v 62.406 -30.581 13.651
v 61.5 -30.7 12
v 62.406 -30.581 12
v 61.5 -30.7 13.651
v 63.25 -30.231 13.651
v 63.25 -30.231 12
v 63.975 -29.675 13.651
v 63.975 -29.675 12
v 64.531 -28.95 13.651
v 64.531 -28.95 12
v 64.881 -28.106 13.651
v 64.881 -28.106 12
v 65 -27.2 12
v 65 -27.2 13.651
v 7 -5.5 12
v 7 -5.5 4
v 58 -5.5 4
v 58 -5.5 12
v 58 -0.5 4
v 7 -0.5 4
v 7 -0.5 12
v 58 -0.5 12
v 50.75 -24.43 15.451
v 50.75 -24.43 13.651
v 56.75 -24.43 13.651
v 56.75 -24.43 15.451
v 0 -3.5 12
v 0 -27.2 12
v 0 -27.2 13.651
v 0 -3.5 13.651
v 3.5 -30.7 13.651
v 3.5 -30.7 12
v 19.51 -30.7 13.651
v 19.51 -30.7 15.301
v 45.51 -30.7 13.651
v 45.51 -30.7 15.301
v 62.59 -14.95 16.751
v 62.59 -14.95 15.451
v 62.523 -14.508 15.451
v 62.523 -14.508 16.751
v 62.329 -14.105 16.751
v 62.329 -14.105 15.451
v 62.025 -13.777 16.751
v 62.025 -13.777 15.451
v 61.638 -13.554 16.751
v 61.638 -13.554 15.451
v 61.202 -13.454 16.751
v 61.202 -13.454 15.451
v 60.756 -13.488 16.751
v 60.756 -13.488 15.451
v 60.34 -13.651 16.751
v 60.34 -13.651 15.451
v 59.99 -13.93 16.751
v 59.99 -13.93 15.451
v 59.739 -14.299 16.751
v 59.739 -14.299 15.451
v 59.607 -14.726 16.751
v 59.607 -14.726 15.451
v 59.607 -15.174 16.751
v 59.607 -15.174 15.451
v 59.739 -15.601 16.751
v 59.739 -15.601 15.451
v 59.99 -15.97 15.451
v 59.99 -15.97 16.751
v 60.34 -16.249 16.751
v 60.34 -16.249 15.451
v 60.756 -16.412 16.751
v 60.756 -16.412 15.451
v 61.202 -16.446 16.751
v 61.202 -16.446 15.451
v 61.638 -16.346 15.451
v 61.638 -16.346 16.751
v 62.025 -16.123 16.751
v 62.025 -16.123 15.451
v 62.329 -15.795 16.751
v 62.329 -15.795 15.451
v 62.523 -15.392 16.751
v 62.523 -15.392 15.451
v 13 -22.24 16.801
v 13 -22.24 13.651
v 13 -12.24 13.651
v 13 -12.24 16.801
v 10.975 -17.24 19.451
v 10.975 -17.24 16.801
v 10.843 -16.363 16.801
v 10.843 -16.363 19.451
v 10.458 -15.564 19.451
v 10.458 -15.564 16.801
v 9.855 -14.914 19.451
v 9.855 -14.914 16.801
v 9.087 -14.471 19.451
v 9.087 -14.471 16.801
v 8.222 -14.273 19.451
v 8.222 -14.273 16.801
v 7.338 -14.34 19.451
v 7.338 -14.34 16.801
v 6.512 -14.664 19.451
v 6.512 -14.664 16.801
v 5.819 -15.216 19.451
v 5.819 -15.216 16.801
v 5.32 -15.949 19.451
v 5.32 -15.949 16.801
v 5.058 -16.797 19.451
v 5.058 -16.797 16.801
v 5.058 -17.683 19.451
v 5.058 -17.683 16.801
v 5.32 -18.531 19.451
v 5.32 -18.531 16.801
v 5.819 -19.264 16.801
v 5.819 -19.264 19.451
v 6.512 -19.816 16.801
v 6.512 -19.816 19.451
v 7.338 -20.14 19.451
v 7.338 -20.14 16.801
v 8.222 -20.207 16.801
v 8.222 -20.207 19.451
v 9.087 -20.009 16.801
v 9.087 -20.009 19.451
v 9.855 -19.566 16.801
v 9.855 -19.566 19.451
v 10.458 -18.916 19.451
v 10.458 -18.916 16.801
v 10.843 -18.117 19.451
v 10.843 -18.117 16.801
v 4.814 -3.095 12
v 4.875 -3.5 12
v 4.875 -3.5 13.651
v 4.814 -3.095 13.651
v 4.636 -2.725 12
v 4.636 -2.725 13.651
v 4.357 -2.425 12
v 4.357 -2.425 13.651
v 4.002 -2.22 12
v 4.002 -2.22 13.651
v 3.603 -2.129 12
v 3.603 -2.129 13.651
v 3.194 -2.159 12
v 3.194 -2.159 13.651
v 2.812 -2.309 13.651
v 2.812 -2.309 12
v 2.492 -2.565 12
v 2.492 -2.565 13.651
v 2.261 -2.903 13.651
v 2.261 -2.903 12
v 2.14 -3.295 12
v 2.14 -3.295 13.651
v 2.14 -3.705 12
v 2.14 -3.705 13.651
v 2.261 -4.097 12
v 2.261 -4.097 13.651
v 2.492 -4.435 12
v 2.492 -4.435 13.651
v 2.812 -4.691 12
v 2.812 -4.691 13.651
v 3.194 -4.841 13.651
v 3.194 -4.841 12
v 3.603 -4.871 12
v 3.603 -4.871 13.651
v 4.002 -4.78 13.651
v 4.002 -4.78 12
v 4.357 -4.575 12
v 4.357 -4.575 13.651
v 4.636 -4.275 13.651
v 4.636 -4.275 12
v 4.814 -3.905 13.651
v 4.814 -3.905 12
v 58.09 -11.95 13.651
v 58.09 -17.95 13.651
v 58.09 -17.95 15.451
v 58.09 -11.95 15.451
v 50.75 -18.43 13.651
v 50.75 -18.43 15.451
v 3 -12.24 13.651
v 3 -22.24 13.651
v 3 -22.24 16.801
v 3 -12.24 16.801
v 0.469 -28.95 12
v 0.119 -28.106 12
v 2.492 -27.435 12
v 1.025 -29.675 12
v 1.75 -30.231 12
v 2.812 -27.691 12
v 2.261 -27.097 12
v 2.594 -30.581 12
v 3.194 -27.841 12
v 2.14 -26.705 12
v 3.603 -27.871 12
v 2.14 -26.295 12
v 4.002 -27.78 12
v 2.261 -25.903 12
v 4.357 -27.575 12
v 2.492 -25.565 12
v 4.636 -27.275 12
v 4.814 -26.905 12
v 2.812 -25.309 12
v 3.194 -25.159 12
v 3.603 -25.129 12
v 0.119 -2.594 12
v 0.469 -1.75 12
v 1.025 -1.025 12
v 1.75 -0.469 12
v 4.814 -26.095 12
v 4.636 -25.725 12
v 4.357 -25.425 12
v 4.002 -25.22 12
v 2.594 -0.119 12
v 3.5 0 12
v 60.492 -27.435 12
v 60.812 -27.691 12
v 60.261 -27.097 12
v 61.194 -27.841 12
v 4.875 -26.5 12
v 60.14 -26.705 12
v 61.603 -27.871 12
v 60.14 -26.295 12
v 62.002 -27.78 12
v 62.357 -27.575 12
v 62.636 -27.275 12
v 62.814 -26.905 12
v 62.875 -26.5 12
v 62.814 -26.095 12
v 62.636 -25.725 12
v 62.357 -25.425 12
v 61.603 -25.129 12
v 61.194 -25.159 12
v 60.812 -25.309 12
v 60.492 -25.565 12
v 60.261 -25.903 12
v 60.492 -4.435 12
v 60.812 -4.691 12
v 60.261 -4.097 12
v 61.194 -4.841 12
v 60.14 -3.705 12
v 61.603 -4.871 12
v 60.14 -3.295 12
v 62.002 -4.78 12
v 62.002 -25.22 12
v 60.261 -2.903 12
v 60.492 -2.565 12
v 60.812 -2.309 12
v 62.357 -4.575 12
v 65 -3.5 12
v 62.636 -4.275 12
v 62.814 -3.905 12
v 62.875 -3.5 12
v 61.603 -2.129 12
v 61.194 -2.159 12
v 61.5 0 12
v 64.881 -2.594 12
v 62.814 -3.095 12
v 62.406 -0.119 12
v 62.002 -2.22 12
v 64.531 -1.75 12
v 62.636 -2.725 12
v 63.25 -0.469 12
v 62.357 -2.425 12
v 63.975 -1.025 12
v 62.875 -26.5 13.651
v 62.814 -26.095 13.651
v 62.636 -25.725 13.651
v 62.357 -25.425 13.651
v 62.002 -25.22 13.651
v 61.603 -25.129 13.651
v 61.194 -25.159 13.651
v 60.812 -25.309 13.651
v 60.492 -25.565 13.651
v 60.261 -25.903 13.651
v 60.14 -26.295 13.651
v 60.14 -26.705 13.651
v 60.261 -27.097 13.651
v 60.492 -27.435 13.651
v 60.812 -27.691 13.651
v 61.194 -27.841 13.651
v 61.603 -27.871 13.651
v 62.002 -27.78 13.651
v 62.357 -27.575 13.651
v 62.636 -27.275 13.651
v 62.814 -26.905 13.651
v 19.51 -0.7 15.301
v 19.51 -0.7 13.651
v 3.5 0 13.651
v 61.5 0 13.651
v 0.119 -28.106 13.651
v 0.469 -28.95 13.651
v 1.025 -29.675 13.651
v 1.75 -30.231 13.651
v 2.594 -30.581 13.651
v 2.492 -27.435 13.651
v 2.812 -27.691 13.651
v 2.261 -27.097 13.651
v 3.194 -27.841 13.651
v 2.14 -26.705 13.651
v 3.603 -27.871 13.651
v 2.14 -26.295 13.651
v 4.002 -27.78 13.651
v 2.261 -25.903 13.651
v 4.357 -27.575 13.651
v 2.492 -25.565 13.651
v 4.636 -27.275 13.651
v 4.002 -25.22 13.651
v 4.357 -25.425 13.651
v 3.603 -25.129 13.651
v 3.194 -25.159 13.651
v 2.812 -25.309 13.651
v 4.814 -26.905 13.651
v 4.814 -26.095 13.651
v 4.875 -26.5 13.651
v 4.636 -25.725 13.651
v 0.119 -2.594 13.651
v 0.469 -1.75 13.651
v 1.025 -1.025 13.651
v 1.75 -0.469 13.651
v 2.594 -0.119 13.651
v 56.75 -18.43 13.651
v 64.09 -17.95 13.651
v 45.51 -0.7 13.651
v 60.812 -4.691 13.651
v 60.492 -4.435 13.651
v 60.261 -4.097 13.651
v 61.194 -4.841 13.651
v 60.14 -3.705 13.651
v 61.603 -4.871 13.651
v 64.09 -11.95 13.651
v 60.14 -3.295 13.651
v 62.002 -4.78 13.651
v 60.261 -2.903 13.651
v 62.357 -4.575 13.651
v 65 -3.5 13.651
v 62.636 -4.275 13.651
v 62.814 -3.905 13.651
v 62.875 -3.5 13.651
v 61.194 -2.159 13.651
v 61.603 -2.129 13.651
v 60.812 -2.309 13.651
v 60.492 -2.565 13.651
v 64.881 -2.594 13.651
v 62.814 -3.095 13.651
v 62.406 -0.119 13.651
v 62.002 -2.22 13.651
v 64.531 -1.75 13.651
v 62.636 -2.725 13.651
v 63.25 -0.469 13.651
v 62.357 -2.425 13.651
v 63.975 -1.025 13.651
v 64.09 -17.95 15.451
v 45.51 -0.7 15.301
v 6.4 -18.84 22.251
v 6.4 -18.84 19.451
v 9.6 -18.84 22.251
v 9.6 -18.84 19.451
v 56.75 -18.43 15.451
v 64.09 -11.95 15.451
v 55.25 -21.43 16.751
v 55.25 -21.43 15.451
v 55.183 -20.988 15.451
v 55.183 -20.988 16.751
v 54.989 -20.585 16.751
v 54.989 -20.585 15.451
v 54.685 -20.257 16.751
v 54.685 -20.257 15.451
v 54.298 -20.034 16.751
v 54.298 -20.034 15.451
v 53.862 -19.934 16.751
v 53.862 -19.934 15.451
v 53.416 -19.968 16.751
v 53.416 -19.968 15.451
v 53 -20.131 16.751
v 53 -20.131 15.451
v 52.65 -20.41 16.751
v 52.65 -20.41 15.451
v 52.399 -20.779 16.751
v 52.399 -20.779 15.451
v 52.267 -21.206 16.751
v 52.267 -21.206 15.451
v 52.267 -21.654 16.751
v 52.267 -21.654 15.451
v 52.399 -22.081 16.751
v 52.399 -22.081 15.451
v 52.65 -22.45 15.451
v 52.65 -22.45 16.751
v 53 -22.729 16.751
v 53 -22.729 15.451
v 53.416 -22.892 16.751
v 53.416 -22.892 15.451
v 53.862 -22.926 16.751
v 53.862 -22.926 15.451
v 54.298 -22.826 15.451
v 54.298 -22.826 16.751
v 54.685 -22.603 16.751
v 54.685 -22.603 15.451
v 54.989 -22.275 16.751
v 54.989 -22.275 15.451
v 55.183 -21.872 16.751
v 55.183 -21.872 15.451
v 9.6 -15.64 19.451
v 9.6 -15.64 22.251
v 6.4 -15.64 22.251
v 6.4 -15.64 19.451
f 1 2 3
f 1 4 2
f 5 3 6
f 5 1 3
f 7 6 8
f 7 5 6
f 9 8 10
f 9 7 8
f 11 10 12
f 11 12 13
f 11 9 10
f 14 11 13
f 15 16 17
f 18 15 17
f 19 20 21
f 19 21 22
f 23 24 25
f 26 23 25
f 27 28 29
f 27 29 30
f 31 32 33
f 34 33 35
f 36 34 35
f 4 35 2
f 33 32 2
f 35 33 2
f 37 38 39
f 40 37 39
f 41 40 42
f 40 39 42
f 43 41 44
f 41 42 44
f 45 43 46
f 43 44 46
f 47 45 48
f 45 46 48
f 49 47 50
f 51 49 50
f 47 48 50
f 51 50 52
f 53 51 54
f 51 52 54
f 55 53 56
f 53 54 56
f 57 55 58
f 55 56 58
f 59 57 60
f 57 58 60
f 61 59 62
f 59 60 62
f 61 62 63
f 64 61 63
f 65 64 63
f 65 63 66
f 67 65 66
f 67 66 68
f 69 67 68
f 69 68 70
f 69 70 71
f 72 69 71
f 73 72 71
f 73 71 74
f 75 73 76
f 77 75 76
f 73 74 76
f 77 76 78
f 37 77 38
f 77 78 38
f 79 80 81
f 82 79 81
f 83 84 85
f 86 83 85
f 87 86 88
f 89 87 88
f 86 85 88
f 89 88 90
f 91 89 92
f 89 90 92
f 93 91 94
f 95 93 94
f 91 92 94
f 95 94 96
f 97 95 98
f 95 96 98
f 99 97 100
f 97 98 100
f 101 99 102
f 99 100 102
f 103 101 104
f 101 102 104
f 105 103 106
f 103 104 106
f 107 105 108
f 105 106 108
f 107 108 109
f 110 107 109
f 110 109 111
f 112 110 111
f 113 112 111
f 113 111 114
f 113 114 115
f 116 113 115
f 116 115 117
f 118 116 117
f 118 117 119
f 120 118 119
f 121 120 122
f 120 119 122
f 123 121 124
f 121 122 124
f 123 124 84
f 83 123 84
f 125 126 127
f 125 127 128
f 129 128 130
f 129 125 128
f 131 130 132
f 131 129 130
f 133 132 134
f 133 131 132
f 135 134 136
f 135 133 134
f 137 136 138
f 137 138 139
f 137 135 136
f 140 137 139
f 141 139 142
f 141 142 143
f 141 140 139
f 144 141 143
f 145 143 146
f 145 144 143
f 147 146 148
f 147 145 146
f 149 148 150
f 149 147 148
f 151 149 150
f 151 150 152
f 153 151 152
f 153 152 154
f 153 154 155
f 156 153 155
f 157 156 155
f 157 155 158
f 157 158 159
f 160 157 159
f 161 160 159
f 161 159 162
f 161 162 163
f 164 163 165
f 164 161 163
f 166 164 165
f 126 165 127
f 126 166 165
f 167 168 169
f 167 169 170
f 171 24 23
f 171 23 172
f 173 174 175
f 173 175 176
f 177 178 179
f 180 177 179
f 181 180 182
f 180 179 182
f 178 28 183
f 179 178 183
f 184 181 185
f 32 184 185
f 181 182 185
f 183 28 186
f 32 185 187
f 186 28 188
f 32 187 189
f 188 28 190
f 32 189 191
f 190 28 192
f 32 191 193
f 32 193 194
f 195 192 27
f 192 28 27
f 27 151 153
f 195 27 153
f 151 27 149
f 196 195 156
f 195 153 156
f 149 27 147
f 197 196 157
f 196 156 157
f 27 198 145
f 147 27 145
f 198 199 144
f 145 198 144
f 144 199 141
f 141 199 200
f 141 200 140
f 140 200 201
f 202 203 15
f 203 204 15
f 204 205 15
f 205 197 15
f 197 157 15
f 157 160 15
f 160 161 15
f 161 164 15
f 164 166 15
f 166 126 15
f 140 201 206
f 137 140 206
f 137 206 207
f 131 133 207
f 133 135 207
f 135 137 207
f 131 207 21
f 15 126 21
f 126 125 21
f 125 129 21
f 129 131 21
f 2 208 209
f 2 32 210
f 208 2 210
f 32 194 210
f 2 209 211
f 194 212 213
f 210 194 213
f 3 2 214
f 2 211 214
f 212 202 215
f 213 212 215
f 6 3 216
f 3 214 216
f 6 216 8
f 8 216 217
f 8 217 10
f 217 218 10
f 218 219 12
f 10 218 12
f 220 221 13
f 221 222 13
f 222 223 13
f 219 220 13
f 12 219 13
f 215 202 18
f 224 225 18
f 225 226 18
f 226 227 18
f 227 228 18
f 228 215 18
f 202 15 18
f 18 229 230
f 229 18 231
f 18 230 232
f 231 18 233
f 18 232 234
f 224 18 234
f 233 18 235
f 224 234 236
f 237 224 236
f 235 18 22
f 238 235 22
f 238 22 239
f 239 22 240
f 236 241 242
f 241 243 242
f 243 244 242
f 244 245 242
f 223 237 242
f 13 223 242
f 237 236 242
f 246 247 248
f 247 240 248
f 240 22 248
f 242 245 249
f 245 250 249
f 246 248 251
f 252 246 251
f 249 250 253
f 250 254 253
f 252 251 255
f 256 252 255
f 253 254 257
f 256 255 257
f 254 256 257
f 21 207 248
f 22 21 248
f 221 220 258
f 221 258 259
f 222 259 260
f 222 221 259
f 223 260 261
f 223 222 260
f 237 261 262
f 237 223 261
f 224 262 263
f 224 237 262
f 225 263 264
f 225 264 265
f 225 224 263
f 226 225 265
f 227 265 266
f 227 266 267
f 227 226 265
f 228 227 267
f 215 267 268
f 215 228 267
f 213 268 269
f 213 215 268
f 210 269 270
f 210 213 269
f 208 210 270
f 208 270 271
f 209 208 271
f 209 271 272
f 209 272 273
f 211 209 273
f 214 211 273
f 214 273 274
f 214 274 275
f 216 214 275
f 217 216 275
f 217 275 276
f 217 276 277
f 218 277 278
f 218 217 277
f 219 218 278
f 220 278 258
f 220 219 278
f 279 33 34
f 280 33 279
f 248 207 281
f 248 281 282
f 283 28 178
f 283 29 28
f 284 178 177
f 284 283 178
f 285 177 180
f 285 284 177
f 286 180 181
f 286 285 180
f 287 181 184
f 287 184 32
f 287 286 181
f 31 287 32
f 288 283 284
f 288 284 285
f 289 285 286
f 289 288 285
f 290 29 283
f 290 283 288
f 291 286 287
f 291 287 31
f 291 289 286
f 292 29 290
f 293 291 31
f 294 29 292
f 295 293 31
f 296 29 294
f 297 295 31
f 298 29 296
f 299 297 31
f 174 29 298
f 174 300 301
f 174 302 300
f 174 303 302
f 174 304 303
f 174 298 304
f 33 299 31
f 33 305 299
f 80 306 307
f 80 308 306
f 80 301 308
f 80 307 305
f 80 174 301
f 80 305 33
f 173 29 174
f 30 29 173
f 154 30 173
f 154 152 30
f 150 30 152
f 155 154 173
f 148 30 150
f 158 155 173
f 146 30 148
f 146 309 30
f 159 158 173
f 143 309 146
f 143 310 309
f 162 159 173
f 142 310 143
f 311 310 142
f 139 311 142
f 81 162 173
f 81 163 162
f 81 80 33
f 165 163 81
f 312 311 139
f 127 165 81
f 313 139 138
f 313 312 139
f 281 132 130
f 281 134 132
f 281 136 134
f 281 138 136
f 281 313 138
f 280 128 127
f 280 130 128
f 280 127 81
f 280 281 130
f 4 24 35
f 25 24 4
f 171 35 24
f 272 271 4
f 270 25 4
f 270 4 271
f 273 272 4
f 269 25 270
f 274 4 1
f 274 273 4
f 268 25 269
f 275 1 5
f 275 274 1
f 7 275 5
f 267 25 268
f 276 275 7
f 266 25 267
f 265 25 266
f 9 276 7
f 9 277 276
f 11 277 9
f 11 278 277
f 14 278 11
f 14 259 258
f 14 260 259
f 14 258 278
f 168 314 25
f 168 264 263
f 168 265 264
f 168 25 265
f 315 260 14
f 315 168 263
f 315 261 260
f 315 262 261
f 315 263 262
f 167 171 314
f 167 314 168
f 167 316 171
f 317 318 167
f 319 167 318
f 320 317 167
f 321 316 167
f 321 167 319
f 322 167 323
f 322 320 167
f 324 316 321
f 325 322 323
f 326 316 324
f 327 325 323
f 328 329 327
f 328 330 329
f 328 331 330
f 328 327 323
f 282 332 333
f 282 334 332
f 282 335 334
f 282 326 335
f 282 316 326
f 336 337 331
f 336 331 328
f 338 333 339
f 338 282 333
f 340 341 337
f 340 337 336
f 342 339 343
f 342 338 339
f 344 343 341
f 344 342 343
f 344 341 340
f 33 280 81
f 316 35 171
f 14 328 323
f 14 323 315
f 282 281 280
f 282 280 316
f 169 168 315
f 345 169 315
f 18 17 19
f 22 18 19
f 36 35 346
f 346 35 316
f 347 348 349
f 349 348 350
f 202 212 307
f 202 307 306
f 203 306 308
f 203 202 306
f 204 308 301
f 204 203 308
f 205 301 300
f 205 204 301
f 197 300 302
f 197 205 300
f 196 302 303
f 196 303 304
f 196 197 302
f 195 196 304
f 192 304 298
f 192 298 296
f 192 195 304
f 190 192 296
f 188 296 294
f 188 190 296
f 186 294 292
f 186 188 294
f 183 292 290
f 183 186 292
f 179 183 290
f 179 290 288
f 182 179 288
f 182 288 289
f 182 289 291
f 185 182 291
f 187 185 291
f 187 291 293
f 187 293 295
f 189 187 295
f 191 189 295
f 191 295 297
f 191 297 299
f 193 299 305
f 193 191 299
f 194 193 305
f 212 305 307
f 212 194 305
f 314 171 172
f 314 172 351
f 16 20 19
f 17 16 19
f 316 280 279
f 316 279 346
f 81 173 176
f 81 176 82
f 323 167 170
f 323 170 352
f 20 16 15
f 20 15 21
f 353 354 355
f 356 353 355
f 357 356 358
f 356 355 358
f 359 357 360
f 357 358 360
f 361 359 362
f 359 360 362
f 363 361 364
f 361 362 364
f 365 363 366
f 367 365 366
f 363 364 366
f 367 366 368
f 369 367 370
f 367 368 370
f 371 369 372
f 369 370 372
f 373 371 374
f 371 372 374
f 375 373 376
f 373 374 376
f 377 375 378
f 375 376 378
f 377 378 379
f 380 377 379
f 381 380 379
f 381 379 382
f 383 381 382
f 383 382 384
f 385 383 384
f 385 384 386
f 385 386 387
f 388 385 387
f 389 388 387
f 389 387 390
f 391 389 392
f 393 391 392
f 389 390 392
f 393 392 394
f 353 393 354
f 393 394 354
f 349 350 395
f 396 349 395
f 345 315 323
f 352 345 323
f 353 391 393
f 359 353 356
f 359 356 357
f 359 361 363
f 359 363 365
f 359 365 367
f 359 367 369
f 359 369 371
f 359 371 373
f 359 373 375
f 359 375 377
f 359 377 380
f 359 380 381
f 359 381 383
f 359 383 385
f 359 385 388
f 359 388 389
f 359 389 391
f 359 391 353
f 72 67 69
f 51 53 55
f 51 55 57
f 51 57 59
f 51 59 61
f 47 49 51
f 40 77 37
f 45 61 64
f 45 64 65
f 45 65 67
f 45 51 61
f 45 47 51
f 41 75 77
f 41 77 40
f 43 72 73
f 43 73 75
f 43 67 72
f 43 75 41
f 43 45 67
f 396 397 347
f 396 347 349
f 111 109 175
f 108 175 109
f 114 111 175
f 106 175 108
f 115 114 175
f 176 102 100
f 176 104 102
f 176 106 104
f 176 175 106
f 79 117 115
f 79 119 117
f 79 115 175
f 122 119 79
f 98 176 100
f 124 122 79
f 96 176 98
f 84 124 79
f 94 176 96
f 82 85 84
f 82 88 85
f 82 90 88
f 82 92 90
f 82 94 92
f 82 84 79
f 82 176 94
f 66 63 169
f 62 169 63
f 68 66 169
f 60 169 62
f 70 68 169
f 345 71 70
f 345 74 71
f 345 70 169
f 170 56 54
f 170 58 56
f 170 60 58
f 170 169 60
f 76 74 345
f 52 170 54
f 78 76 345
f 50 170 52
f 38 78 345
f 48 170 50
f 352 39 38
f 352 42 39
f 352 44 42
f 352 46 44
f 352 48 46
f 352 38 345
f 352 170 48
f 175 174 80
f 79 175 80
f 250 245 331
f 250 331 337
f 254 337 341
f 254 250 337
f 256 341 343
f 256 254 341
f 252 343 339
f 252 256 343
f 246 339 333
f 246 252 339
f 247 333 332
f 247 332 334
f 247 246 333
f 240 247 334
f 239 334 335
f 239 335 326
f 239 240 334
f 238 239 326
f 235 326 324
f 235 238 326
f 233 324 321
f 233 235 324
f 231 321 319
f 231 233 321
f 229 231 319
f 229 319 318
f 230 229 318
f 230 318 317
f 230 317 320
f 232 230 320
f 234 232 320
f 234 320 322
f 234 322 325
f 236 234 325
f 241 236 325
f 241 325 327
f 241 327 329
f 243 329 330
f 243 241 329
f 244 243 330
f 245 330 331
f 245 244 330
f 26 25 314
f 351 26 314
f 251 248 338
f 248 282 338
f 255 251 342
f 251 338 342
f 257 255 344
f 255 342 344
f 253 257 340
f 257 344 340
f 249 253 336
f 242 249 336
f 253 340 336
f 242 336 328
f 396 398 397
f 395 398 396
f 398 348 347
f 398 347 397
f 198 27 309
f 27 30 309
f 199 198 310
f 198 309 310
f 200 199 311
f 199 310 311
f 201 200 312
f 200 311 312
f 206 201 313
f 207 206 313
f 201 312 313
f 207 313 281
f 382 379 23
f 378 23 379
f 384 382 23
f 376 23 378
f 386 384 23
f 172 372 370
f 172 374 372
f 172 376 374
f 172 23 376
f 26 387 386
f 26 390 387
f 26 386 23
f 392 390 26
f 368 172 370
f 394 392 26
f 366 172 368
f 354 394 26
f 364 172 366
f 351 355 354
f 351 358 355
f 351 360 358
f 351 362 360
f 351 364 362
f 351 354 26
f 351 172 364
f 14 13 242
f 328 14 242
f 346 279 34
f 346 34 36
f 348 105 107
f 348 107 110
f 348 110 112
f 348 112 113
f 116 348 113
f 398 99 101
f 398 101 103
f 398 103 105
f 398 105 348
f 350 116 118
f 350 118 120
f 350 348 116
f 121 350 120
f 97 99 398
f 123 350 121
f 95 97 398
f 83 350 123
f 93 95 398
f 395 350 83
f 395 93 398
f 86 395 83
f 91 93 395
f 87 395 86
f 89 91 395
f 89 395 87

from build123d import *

# Parameters (mm, degrees)
SKETCH013_W  = 51
SKETCH013_H  = 5
PAD011_DEPTH = 8
SKETCH014_W  = 65
SKETCH014_H  = 30.7
SKETCH014_R  = 1.375
PAD012_DEPTH = 1.651
FILLET003_R  = 3.5
SKETCH017_W  = 10
SKETCH017_H  = 10
PAD014_DEPTH = 3.15
SKETCH018_R  = 2.975
PAD015_DEPTH = 2.65
SKETCH019_W  = 3.2
SKETCH019_H  = 3.2
PAD016_DEPTH = 2.8
SKETCH020_W  = 6
SKETCH020_H  = 6
PAD017_DEPTH = 1.8
SKETCH021_R  = 1.5
PAD018_DEPTH = 1.3
SKETCH022_W  = 26
SKETCH022_H  = 30
PAD019_DEPTH = 1.65


with BuildPart() as part:
    # Sketch013 → Pad011 (new body)
    with BuildSketch(Plane.XY):
        with Locations((32.5, -3)):
            Rectangle(SKETCH013_W, SKETCH013_H)
    extrude(amount=PAD011_DEPTH)

    # Sketch014 (on Face6 of Pad011) → Pad012 (join)
    with BuildSketch(Plane.XY.offset(8)):
        with Locations((32.5, -15.35)):
            Rectangle(SKETCH014_W, SKETCH014_H)
        with Locations((3.5, -3.5)):
            Circle(SKETCH014_R, mode=Mode.SUBTRACT)
        with Locations((61.5, -3.5)):
            Circle(SKETCH014_R, mode=Mode.SUBTRACT)
        with Locations((61.5, -26.5)):
            Circle(SKETCH014_R, mode=Mode.SUBTRACT)
        with Locations((3.5, -26.5)):
            Circle(SKETCH014_R, mode=Mode.SUBTRACT)
    extrude(amount=PAD012_DEPTH)

    # Fillet003
    fillet003_edges = [part.edges().sort_by_distance(p)[0] for p in [
        (0, 0, 8.8255),
        (0, -30.7, 8.8255),
        (65, -30.7, 8.8255),
        (65, 0, 8.8255),
    ]]
    fillet(fillet003_edges, radius=FILLET003_R)

    # Sketch017 (on Face5 of Fillet003) → Pad014 (join)
    with BuildSketch(Plane.XY.offset(9.651)):
        with Locations((8, -17.24)):
            Rectangle(SKETCH017_W, SKETCH017_H)
    extrude(amount=PAD014_DEPTH)

    # Sketch018 (on Face24 of Pad014) → Pad015 (join)
    with BuildSketch(Plane.XY.offset(12.801)):
        with Locations((8, -17.24)):
            Circle(SKETCH018_R)
    extrude(amount=PAD015_DEPTH)

    # Sketch019 (on Face26 of Pad015) → Pad016 (join)
    with BuildSketch(Plane.XY.offset(15.451)):
        with Locations((8, -17.24)):
            Rectangle(SKETCH019_W, SKETCH019_H)
    extrude(amount=PAD016_DEPTH)

    # Sketch020 (on Face5 of Pad016) → Pad017 (join)
    with BuildSketch(Plane.XY.offset(9.651)):
        with Locations((61.09, -14.95)):
            Rectangle(SKETCH020_W, SKETCH020_H)
        with Locations((53.75, -21.43)):
            Rectangle(SKETCH020_W, SKETCH020_H)
    extrude(amount=PAD017_DEPTH)

    # Sketch021 (on Face34 of Pad017) → Pad018 (join)
    with BuildSketch(Plane.XY.offset(11.451)):
        with Locations((53.75, -21.43)):
            Circle(SKETCH021_R)
        with Locations((61.09, -14.95)):
            Circle(SKETCH021_R)
    extrude(amount=PAD018_DEPTH)

    # Sketch022 (on Face5 of Pad018) → Pad019 (join)
    with BuildSketch(Plane.XY.offset(9.651)):
        with Locations((32.51, -15.7)):
            Rectangle(SKETCH022_W, SKETCH022_H)
    extrude(amount=PAD019_DEPTH)


with BuildPart() as part_1:
    # Body002 placement: moved
    add(part.part.moved(Location((0, 0, 4))))


solid = part_1.part
